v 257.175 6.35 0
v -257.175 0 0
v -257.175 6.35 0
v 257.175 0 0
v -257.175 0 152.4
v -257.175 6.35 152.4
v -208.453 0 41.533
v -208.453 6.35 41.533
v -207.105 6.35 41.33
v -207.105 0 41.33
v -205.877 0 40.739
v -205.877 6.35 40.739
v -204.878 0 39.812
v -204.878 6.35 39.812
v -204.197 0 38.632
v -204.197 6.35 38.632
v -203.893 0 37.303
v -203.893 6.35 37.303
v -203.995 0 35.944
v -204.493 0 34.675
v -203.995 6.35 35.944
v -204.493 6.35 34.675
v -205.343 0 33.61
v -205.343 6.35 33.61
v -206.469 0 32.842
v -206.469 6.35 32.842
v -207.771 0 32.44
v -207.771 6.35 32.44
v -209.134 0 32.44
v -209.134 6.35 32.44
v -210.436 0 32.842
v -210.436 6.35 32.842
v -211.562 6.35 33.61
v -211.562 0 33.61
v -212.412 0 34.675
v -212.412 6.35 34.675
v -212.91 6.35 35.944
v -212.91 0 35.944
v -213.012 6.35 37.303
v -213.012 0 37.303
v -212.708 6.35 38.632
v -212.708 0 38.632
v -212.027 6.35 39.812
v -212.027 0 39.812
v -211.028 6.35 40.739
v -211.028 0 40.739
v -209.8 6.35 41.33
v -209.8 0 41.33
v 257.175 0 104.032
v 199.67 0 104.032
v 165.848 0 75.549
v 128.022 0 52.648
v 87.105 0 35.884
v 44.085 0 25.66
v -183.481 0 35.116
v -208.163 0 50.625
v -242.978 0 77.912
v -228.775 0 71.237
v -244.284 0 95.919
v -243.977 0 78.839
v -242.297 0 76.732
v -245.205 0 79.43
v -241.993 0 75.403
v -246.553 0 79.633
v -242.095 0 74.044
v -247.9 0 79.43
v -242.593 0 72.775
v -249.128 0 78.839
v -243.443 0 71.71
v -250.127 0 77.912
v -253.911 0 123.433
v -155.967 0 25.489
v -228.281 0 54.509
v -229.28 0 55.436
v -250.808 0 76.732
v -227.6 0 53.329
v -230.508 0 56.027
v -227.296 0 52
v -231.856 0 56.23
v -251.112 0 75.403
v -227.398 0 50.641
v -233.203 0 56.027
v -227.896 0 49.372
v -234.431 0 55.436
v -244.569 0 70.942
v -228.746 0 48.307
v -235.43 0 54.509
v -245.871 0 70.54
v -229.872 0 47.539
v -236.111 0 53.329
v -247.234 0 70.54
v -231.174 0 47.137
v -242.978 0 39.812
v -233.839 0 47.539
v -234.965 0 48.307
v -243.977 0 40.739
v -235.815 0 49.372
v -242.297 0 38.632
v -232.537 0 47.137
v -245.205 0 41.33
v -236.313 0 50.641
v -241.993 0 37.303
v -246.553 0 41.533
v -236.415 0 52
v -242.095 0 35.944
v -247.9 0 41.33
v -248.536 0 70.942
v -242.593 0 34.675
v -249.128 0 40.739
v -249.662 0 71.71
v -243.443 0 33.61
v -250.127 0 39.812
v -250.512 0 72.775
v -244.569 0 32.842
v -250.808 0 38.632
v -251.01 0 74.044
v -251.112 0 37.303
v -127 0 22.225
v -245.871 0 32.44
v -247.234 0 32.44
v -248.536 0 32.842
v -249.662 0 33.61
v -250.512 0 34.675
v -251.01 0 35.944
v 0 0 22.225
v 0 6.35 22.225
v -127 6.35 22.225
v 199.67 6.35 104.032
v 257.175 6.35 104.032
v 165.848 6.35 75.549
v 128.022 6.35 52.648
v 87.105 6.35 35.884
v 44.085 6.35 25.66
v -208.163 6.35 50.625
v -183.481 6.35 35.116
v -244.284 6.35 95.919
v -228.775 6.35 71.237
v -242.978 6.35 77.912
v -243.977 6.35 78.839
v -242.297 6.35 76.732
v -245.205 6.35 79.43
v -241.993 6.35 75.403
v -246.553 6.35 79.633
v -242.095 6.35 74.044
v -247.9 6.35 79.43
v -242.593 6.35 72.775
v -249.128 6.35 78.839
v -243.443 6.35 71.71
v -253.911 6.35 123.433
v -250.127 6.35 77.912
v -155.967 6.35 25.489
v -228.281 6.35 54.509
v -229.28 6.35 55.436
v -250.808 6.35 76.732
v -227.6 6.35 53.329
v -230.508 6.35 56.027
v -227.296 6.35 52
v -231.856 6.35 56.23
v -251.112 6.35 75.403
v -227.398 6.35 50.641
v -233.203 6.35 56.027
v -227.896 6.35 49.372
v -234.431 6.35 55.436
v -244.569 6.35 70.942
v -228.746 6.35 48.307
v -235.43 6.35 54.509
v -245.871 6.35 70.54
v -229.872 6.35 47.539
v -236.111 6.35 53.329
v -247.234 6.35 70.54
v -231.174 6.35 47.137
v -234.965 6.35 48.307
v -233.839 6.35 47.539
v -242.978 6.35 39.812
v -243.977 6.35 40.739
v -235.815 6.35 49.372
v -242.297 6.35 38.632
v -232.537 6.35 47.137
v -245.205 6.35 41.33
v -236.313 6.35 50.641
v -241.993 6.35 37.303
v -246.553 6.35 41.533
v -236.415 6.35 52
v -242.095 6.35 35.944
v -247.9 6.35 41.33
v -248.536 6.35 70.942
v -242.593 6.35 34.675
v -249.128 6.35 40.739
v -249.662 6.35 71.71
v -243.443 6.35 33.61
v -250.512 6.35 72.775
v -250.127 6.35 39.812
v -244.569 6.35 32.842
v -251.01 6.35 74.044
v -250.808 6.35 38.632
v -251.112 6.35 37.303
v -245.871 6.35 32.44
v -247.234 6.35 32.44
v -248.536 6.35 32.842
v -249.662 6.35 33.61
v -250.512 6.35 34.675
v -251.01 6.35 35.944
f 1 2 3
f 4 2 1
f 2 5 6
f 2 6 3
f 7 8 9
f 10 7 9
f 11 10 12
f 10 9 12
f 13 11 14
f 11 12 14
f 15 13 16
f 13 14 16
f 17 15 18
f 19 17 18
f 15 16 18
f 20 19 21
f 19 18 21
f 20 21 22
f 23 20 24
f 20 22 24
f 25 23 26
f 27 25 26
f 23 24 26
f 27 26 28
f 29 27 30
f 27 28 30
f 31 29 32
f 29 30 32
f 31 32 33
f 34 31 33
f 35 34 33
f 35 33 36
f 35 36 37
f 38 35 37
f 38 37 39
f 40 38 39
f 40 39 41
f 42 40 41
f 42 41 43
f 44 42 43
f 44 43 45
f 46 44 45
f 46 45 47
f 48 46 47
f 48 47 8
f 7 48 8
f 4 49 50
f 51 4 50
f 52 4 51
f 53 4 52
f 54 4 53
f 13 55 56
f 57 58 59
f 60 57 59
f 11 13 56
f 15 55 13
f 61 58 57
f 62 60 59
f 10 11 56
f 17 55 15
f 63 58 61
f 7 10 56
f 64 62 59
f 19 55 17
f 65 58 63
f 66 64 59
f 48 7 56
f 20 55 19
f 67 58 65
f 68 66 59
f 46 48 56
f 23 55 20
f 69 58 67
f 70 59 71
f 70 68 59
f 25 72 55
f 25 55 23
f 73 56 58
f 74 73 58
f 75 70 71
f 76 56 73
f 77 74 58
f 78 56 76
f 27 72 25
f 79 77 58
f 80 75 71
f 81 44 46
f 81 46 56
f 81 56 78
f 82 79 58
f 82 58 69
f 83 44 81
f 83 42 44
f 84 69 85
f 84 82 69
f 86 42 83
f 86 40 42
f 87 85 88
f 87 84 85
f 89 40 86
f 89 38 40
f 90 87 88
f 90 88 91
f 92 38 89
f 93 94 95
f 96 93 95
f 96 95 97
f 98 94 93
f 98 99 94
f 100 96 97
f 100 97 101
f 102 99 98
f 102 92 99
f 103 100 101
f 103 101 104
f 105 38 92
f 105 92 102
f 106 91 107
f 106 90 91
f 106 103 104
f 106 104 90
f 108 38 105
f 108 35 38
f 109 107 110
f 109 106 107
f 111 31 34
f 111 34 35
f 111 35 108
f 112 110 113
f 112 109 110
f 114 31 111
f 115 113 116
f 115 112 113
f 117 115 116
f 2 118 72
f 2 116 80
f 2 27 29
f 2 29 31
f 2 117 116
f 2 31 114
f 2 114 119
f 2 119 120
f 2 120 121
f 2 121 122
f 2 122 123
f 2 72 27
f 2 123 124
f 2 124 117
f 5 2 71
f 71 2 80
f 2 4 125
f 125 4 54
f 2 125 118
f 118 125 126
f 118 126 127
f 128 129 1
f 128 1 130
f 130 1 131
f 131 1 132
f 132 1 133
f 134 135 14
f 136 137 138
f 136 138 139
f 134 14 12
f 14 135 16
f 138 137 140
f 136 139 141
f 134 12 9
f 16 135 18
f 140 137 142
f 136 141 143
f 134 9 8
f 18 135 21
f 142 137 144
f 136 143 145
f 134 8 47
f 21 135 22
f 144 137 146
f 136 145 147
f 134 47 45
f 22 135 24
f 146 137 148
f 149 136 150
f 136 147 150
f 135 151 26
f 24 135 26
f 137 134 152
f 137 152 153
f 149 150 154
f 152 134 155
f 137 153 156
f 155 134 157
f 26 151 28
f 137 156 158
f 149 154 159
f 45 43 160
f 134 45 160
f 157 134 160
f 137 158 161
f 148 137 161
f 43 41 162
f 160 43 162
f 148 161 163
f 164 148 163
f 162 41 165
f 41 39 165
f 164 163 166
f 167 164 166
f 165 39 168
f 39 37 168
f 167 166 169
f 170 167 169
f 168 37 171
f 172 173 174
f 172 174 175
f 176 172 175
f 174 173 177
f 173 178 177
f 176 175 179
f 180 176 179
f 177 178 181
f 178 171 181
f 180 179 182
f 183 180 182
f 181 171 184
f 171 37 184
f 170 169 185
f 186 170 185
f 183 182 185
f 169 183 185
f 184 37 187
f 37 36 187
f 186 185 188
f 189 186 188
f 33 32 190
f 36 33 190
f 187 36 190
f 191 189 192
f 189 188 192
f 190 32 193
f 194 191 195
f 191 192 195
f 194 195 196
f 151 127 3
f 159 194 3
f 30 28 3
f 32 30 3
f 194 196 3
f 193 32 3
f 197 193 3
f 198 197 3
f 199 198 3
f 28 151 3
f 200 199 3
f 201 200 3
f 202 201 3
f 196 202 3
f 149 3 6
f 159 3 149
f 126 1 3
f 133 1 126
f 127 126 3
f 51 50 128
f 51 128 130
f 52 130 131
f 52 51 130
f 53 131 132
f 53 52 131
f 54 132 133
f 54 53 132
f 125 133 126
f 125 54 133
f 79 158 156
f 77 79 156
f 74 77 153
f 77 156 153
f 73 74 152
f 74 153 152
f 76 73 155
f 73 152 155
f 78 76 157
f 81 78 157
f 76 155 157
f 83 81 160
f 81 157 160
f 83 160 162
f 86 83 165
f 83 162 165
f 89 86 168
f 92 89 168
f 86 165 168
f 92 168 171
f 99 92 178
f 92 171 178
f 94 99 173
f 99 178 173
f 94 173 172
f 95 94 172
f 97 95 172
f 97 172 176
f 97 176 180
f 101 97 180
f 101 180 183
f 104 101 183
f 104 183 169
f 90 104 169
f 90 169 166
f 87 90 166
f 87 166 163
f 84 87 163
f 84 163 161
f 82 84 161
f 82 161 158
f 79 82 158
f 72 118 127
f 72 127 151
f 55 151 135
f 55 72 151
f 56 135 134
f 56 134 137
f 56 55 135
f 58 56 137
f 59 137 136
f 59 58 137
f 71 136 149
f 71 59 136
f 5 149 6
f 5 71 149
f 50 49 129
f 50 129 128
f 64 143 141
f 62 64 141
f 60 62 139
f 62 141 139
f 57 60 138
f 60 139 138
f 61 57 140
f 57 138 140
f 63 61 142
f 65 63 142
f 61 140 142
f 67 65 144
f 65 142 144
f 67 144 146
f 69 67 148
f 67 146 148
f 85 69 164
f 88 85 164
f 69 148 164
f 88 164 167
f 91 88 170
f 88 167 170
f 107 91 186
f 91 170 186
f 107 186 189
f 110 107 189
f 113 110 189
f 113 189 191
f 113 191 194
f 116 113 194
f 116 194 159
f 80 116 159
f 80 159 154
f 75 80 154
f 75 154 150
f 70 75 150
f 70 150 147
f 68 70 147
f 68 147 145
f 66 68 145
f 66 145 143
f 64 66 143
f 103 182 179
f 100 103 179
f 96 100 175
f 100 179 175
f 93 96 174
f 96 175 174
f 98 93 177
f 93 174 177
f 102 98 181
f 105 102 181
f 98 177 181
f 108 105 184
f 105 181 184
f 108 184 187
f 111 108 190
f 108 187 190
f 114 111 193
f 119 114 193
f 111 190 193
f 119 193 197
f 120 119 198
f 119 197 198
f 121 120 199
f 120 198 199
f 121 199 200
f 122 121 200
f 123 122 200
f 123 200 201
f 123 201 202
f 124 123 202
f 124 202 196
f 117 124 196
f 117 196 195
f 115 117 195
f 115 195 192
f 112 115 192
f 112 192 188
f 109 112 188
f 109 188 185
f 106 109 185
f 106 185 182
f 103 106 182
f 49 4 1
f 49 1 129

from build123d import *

# Parameters (mm, degrees)
BOSS_EXTRUDE1_DEPTH = 6.35
SKETCH2_W           = 19.05
SKETCH2_H           = 101.6
CUT_EXTRUDE2_DEPTH  = 316.541333465
SKETCH3_R           = 4.572
CUT_EXTRUDE3_DEPTH  = 300.006794446


with BuildPart() as part:
    # Sketch1 → Boss-Extrude1 (new body)
    with BuildSketch(Plane(origin=(0, 0, 0), x_dir=(1, 0, 0), z_dir=(0, 1, 0))):
        with BuildLine():
            Line((-257.175, 0), (257.175, 0))
            Line((257.175, 0), (257.175, -104.032493436))
            Line((257.175, -104.032493436), (199.670208733, -104.032493436))
            ThreePointArc((199.670208733, -104.032493436), (107.889594305, -43.469891278), (0, -22.225))
            Line((0, -22.225), (-127, -22.225))
            ThreePointArc((-127, -22.225), (-219.047625241, -60.352374759), (-257.175, -152.4))
            Line((-257.175, -152.4), (-276.225, -152.4))
            Line((-276.225, -152.4), (-276.225, -50.8))
            Line((-276.225, -50.8), (-257.175, -50.8))
            Line((-257.175, -50.8), (-257.175, 0))
        make_face()
    extrude(amount=BOSS_EXTRUDE1_DEPTH)

    # Sketch2 → Cut-Extrude2 (cut, through all)
    with BuildSketch(Plane(origin=(0, 0, 0), x_dir=(1, 0, 0), z_dir=(0, 1, 0))):
        with Locations((-266.7, -101.6)):
            Rectangle(SKETCH2_W, SKETCH2_H)
    extrude(amount=CUT_EXTRUDE2_DEPTH, mode=Mode.SUBTRACT)

    # Sketch3 → Cut-Extrude3 (cut, through all)
    with BuildSketch(Plane(origin=(0, 6.35, 0), x_dir=(1, 0, 0), z_dir=(0, 1, 0))):
        with Locations(Location((-208.452544448, -36.961239505, 0), (0, 0, 270))):
            Circle(SKETCH3_R)
        with Locations(Location((-246.552544448, -36.961239505, 0), (0, 0, 270))):
            Circle(SKETCH3_R)
        with Locations(Location((-231.855506716, -51.658277238, 0), (0, 0, 270))):
            Circle(SKETCH3_R)
        with Locations(Location((-246.552544448, -75.061239505, 0), (0, 0, 270))):
            Circle(SKETCH3_R)
    extrude(amount=-CUT_EXTRUDE3_DEPTH, mode=Mode.SUBTRACT)


solid = part.part
